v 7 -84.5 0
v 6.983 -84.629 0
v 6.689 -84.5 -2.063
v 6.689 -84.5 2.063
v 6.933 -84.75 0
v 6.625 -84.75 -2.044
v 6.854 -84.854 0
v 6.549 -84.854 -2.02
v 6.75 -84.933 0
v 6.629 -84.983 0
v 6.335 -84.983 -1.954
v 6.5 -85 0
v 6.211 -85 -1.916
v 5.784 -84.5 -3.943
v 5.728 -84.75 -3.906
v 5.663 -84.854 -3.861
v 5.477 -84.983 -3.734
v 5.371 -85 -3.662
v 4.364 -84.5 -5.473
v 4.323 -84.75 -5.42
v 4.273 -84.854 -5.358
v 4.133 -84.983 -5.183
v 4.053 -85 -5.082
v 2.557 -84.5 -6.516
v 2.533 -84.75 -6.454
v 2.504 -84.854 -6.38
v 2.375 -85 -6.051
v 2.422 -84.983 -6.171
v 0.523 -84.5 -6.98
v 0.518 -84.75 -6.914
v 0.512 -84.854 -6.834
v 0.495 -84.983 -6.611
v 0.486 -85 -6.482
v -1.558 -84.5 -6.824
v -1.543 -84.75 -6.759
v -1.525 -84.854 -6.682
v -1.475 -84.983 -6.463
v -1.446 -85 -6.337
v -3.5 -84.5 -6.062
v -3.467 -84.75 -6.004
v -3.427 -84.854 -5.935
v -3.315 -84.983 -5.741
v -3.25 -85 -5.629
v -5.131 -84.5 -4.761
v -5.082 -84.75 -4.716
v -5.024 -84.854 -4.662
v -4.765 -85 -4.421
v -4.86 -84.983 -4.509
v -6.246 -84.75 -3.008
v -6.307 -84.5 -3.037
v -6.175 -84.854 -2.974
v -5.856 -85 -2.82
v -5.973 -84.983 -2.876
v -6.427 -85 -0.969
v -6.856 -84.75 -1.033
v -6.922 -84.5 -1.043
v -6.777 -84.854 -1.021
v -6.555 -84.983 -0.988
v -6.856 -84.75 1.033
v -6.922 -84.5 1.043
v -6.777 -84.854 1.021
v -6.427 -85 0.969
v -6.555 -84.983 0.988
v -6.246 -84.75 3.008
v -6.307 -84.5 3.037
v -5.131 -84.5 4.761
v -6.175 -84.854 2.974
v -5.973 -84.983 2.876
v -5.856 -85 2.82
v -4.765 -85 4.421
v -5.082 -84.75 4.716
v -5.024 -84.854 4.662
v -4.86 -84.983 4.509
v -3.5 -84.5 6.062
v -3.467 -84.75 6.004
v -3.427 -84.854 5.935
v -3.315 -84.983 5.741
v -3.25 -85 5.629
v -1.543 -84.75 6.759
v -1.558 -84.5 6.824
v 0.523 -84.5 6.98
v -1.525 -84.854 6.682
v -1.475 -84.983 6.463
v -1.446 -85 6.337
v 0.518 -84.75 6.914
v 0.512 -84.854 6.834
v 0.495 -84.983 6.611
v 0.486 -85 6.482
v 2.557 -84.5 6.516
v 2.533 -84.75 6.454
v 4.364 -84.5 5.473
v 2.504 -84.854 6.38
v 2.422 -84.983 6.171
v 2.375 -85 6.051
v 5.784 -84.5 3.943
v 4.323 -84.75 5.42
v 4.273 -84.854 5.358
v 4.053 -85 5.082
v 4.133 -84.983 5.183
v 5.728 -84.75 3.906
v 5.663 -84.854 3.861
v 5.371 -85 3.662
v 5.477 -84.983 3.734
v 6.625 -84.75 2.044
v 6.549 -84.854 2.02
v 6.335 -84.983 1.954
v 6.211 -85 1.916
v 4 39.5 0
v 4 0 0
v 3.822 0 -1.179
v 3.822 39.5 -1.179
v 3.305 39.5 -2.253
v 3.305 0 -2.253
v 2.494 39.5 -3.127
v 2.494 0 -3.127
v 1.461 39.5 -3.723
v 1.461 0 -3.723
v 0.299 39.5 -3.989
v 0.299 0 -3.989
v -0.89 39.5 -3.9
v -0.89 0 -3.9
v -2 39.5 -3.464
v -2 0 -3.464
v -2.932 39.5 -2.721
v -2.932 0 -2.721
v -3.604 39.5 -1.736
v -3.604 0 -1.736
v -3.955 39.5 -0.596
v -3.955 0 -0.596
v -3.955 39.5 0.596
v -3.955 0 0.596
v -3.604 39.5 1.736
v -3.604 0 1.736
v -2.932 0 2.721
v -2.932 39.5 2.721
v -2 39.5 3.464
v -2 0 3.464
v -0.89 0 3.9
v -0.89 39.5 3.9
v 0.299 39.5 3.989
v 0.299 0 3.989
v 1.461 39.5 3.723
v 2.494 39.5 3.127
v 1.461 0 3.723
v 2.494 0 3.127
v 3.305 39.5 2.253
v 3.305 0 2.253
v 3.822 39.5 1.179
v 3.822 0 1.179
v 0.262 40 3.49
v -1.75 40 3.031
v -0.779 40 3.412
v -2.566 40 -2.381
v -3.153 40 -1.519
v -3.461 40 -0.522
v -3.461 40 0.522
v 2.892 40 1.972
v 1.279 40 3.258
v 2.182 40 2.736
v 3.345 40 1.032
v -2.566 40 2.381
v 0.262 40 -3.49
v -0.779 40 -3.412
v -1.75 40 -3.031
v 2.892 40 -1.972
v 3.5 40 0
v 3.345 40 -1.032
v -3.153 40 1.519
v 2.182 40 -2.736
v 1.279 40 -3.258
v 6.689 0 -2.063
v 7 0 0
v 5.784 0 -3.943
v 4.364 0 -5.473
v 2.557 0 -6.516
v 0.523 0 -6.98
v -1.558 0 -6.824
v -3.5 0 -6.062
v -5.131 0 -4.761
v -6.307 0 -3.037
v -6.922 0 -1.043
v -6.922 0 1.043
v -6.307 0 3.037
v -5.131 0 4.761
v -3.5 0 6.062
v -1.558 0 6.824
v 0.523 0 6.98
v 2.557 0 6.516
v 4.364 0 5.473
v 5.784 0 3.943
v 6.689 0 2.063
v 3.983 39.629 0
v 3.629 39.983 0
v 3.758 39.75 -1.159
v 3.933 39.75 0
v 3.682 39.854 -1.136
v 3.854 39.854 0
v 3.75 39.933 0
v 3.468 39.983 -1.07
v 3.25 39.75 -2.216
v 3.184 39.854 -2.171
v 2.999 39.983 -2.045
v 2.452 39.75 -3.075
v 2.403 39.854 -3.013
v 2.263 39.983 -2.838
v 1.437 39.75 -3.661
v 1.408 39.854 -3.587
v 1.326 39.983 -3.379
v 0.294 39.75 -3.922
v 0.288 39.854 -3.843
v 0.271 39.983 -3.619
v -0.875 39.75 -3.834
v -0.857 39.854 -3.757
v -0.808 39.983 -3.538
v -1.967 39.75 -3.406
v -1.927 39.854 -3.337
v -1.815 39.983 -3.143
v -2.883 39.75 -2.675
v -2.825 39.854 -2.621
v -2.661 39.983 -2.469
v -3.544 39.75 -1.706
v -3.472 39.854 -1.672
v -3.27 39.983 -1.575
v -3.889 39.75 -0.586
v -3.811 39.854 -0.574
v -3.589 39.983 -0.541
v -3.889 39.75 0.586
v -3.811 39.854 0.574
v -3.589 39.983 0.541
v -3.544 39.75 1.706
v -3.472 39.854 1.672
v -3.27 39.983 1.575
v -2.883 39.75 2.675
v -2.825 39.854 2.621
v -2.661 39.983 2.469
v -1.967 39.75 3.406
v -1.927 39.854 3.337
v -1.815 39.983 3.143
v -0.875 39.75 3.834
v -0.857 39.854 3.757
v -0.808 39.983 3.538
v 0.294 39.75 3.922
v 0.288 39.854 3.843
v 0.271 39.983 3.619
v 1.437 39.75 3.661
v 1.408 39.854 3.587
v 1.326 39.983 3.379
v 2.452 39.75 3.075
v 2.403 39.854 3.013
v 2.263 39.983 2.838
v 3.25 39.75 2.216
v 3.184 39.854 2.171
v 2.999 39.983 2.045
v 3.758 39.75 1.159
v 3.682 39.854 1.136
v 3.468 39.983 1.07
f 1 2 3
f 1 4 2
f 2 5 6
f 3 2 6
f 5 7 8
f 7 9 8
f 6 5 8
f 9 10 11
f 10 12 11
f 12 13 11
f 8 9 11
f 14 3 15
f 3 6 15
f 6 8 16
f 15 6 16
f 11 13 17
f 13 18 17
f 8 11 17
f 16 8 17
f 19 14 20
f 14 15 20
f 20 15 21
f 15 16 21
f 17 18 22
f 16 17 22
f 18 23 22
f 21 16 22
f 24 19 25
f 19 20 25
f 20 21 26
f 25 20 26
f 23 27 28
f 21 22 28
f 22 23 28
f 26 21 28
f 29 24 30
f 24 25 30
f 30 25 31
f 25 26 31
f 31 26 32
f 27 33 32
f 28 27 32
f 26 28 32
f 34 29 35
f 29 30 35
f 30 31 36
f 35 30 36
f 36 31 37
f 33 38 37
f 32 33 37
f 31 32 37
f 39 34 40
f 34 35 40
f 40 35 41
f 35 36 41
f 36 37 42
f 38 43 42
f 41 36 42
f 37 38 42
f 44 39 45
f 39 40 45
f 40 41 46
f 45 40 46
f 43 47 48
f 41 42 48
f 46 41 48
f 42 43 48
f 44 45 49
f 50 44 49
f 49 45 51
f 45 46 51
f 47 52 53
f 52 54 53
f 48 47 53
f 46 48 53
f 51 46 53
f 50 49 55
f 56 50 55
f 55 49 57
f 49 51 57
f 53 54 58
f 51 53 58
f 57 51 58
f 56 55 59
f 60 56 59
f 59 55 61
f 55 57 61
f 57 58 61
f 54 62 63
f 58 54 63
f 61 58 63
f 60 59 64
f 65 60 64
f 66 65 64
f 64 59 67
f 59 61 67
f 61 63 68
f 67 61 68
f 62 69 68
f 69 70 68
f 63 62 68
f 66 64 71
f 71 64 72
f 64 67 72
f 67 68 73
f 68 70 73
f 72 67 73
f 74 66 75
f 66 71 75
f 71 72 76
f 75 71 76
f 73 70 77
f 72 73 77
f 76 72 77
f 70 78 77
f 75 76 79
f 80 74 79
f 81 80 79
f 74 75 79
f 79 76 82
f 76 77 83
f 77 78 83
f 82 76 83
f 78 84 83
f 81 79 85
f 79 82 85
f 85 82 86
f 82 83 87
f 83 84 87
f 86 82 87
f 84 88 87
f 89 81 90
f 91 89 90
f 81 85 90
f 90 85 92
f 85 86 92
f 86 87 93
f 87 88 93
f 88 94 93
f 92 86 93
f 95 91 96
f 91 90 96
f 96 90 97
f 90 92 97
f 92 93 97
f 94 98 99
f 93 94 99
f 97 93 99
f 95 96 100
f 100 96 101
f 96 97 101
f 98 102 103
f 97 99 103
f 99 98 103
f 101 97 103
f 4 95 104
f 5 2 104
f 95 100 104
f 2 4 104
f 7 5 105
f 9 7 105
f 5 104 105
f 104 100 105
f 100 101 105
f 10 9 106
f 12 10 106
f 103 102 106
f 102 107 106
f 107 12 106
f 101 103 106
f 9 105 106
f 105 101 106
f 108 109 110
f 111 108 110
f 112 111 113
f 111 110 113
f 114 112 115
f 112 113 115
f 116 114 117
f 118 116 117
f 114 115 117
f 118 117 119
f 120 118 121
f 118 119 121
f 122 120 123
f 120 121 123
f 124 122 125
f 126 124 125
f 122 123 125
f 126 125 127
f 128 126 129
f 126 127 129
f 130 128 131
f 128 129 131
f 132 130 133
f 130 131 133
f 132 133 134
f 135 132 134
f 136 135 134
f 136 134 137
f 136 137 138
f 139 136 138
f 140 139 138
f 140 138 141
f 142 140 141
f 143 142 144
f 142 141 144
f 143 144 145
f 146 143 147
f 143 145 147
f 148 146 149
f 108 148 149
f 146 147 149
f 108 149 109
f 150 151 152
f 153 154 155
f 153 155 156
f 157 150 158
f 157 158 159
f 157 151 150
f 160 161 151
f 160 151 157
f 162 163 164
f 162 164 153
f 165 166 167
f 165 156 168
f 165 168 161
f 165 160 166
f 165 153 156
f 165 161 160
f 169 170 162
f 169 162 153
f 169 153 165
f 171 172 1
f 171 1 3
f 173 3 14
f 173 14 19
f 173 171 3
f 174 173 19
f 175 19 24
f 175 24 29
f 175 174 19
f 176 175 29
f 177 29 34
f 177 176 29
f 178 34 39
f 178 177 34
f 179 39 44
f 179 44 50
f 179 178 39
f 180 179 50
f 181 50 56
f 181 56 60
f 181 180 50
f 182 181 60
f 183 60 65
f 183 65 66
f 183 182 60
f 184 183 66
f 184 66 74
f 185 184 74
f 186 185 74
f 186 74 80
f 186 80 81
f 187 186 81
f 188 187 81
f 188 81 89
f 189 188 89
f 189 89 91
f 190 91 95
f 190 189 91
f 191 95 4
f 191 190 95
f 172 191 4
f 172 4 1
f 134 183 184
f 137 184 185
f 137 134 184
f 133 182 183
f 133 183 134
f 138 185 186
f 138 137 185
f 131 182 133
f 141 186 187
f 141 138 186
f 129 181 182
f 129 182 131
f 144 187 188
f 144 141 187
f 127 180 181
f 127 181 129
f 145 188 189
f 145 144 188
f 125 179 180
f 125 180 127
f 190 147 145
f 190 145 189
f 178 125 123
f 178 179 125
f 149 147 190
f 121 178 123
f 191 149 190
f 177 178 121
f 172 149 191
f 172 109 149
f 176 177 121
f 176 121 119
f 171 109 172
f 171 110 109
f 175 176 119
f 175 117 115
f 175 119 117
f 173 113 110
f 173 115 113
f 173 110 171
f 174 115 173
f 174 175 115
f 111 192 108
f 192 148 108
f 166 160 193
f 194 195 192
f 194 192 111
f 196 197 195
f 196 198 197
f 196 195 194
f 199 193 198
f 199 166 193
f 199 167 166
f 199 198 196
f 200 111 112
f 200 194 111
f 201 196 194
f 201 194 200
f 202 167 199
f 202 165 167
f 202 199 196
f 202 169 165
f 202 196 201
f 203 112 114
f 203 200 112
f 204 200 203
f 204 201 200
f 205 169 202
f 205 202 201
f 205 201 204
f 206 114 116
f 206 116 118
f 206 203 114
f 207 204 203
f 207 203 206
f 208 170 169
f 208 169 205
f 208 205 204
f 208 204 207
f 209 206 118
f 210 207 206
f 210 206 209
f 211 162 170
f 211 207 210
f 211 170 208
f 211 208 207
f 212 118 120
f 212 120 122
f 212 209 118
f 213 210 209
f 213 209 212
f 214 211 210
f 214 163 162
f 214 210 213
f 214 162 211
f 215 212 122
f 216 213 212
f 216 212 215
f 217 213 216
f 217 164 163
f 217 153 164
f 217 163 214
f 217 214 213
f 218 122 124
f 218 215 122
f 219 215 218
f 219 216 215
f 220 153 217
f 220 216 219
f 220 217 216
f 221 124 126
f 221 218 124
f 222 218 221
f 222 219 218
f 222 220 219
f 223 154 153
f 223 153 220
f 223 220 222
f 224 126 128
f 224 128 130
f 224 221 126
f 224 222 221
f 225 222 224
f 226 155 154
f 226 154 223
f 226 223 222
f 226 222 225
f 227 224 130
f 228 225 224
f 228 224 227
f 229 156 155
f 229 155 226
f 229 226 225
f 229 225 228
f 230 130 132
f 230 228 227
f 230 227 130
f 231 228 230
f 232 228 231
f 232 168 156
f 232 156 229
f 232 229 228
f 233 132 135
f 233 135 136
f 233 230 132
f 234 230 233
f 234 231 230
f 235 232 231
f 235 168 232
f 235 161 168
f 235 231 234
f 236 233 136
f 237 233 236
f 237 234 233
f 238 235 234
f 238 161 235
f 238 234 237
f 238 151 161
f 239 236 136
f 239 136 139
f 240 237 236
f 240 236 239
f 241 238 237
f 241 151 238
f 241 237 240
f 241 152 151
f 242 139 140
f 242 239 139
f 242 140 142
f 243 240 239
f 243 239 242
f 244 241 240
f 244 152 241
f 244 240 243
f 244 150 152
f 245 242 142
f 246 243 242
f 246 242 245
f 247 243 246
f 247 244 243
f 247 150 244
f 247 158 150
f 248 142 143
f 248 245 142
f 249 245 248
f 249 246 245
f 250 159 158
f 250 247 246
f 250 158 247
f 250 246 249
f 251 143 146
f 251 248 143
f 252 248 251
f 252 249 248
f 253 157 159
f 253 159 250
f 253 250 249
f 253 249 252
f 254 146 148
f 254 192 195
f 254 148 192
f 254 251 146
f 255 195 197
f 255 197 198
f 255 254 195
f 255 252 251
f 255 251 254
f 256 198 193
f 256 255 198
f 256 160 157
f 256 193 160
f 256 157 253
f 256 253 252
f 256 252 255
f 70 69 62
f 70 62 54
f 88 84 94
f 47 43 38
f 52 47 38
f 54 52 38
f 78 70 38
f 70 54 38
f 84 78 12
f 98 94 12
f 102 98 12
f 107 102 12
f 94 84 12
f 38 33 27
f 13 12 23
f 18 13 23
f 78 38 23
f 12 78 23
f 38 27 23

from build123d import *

# Parameters (mm, degrees)
SKETCH1_R           = 4
BOSS_EXTRUDE1_DEPTH = 40
SKETCH1_3_R         = 7
BOSS_EXTRUDE2_DEPTH = 85
FILLET1_R           = 0.5


with BuildPart() as part:
    # Sketch1 → Boss-Extrude1 (new body)
    with BuildSketch(Plane(origin=(0, 0, 0), x_dir=(1, 0, 0), z_dir=(0, 1, 0))):
        Circle(SKETCH1_R)
    extrude(amount=BOSS_EXTRUDE1_DEPTH)

    # Sketch1<3> → Boss-Extrude2 (add)
    with BuildSketch(Plane(origin=(0, 0, 0), x_dir=(1, 0, 0), z_dir=(0, 1, 0))):
        Circle(SKETCH1_3_R)
    extrude(amount=-BOSS_EXTRUDE2_DEPTH)

    # Fillet1
    fillet1_edges = [part.edges().sort_by_distance(p)[0] for p in [
        (-7, -85, 0),
        (-4, 40, 0),
    ]]
    fillet(fillet1_edges, radius=FILLET1_R)


solid = part.part
